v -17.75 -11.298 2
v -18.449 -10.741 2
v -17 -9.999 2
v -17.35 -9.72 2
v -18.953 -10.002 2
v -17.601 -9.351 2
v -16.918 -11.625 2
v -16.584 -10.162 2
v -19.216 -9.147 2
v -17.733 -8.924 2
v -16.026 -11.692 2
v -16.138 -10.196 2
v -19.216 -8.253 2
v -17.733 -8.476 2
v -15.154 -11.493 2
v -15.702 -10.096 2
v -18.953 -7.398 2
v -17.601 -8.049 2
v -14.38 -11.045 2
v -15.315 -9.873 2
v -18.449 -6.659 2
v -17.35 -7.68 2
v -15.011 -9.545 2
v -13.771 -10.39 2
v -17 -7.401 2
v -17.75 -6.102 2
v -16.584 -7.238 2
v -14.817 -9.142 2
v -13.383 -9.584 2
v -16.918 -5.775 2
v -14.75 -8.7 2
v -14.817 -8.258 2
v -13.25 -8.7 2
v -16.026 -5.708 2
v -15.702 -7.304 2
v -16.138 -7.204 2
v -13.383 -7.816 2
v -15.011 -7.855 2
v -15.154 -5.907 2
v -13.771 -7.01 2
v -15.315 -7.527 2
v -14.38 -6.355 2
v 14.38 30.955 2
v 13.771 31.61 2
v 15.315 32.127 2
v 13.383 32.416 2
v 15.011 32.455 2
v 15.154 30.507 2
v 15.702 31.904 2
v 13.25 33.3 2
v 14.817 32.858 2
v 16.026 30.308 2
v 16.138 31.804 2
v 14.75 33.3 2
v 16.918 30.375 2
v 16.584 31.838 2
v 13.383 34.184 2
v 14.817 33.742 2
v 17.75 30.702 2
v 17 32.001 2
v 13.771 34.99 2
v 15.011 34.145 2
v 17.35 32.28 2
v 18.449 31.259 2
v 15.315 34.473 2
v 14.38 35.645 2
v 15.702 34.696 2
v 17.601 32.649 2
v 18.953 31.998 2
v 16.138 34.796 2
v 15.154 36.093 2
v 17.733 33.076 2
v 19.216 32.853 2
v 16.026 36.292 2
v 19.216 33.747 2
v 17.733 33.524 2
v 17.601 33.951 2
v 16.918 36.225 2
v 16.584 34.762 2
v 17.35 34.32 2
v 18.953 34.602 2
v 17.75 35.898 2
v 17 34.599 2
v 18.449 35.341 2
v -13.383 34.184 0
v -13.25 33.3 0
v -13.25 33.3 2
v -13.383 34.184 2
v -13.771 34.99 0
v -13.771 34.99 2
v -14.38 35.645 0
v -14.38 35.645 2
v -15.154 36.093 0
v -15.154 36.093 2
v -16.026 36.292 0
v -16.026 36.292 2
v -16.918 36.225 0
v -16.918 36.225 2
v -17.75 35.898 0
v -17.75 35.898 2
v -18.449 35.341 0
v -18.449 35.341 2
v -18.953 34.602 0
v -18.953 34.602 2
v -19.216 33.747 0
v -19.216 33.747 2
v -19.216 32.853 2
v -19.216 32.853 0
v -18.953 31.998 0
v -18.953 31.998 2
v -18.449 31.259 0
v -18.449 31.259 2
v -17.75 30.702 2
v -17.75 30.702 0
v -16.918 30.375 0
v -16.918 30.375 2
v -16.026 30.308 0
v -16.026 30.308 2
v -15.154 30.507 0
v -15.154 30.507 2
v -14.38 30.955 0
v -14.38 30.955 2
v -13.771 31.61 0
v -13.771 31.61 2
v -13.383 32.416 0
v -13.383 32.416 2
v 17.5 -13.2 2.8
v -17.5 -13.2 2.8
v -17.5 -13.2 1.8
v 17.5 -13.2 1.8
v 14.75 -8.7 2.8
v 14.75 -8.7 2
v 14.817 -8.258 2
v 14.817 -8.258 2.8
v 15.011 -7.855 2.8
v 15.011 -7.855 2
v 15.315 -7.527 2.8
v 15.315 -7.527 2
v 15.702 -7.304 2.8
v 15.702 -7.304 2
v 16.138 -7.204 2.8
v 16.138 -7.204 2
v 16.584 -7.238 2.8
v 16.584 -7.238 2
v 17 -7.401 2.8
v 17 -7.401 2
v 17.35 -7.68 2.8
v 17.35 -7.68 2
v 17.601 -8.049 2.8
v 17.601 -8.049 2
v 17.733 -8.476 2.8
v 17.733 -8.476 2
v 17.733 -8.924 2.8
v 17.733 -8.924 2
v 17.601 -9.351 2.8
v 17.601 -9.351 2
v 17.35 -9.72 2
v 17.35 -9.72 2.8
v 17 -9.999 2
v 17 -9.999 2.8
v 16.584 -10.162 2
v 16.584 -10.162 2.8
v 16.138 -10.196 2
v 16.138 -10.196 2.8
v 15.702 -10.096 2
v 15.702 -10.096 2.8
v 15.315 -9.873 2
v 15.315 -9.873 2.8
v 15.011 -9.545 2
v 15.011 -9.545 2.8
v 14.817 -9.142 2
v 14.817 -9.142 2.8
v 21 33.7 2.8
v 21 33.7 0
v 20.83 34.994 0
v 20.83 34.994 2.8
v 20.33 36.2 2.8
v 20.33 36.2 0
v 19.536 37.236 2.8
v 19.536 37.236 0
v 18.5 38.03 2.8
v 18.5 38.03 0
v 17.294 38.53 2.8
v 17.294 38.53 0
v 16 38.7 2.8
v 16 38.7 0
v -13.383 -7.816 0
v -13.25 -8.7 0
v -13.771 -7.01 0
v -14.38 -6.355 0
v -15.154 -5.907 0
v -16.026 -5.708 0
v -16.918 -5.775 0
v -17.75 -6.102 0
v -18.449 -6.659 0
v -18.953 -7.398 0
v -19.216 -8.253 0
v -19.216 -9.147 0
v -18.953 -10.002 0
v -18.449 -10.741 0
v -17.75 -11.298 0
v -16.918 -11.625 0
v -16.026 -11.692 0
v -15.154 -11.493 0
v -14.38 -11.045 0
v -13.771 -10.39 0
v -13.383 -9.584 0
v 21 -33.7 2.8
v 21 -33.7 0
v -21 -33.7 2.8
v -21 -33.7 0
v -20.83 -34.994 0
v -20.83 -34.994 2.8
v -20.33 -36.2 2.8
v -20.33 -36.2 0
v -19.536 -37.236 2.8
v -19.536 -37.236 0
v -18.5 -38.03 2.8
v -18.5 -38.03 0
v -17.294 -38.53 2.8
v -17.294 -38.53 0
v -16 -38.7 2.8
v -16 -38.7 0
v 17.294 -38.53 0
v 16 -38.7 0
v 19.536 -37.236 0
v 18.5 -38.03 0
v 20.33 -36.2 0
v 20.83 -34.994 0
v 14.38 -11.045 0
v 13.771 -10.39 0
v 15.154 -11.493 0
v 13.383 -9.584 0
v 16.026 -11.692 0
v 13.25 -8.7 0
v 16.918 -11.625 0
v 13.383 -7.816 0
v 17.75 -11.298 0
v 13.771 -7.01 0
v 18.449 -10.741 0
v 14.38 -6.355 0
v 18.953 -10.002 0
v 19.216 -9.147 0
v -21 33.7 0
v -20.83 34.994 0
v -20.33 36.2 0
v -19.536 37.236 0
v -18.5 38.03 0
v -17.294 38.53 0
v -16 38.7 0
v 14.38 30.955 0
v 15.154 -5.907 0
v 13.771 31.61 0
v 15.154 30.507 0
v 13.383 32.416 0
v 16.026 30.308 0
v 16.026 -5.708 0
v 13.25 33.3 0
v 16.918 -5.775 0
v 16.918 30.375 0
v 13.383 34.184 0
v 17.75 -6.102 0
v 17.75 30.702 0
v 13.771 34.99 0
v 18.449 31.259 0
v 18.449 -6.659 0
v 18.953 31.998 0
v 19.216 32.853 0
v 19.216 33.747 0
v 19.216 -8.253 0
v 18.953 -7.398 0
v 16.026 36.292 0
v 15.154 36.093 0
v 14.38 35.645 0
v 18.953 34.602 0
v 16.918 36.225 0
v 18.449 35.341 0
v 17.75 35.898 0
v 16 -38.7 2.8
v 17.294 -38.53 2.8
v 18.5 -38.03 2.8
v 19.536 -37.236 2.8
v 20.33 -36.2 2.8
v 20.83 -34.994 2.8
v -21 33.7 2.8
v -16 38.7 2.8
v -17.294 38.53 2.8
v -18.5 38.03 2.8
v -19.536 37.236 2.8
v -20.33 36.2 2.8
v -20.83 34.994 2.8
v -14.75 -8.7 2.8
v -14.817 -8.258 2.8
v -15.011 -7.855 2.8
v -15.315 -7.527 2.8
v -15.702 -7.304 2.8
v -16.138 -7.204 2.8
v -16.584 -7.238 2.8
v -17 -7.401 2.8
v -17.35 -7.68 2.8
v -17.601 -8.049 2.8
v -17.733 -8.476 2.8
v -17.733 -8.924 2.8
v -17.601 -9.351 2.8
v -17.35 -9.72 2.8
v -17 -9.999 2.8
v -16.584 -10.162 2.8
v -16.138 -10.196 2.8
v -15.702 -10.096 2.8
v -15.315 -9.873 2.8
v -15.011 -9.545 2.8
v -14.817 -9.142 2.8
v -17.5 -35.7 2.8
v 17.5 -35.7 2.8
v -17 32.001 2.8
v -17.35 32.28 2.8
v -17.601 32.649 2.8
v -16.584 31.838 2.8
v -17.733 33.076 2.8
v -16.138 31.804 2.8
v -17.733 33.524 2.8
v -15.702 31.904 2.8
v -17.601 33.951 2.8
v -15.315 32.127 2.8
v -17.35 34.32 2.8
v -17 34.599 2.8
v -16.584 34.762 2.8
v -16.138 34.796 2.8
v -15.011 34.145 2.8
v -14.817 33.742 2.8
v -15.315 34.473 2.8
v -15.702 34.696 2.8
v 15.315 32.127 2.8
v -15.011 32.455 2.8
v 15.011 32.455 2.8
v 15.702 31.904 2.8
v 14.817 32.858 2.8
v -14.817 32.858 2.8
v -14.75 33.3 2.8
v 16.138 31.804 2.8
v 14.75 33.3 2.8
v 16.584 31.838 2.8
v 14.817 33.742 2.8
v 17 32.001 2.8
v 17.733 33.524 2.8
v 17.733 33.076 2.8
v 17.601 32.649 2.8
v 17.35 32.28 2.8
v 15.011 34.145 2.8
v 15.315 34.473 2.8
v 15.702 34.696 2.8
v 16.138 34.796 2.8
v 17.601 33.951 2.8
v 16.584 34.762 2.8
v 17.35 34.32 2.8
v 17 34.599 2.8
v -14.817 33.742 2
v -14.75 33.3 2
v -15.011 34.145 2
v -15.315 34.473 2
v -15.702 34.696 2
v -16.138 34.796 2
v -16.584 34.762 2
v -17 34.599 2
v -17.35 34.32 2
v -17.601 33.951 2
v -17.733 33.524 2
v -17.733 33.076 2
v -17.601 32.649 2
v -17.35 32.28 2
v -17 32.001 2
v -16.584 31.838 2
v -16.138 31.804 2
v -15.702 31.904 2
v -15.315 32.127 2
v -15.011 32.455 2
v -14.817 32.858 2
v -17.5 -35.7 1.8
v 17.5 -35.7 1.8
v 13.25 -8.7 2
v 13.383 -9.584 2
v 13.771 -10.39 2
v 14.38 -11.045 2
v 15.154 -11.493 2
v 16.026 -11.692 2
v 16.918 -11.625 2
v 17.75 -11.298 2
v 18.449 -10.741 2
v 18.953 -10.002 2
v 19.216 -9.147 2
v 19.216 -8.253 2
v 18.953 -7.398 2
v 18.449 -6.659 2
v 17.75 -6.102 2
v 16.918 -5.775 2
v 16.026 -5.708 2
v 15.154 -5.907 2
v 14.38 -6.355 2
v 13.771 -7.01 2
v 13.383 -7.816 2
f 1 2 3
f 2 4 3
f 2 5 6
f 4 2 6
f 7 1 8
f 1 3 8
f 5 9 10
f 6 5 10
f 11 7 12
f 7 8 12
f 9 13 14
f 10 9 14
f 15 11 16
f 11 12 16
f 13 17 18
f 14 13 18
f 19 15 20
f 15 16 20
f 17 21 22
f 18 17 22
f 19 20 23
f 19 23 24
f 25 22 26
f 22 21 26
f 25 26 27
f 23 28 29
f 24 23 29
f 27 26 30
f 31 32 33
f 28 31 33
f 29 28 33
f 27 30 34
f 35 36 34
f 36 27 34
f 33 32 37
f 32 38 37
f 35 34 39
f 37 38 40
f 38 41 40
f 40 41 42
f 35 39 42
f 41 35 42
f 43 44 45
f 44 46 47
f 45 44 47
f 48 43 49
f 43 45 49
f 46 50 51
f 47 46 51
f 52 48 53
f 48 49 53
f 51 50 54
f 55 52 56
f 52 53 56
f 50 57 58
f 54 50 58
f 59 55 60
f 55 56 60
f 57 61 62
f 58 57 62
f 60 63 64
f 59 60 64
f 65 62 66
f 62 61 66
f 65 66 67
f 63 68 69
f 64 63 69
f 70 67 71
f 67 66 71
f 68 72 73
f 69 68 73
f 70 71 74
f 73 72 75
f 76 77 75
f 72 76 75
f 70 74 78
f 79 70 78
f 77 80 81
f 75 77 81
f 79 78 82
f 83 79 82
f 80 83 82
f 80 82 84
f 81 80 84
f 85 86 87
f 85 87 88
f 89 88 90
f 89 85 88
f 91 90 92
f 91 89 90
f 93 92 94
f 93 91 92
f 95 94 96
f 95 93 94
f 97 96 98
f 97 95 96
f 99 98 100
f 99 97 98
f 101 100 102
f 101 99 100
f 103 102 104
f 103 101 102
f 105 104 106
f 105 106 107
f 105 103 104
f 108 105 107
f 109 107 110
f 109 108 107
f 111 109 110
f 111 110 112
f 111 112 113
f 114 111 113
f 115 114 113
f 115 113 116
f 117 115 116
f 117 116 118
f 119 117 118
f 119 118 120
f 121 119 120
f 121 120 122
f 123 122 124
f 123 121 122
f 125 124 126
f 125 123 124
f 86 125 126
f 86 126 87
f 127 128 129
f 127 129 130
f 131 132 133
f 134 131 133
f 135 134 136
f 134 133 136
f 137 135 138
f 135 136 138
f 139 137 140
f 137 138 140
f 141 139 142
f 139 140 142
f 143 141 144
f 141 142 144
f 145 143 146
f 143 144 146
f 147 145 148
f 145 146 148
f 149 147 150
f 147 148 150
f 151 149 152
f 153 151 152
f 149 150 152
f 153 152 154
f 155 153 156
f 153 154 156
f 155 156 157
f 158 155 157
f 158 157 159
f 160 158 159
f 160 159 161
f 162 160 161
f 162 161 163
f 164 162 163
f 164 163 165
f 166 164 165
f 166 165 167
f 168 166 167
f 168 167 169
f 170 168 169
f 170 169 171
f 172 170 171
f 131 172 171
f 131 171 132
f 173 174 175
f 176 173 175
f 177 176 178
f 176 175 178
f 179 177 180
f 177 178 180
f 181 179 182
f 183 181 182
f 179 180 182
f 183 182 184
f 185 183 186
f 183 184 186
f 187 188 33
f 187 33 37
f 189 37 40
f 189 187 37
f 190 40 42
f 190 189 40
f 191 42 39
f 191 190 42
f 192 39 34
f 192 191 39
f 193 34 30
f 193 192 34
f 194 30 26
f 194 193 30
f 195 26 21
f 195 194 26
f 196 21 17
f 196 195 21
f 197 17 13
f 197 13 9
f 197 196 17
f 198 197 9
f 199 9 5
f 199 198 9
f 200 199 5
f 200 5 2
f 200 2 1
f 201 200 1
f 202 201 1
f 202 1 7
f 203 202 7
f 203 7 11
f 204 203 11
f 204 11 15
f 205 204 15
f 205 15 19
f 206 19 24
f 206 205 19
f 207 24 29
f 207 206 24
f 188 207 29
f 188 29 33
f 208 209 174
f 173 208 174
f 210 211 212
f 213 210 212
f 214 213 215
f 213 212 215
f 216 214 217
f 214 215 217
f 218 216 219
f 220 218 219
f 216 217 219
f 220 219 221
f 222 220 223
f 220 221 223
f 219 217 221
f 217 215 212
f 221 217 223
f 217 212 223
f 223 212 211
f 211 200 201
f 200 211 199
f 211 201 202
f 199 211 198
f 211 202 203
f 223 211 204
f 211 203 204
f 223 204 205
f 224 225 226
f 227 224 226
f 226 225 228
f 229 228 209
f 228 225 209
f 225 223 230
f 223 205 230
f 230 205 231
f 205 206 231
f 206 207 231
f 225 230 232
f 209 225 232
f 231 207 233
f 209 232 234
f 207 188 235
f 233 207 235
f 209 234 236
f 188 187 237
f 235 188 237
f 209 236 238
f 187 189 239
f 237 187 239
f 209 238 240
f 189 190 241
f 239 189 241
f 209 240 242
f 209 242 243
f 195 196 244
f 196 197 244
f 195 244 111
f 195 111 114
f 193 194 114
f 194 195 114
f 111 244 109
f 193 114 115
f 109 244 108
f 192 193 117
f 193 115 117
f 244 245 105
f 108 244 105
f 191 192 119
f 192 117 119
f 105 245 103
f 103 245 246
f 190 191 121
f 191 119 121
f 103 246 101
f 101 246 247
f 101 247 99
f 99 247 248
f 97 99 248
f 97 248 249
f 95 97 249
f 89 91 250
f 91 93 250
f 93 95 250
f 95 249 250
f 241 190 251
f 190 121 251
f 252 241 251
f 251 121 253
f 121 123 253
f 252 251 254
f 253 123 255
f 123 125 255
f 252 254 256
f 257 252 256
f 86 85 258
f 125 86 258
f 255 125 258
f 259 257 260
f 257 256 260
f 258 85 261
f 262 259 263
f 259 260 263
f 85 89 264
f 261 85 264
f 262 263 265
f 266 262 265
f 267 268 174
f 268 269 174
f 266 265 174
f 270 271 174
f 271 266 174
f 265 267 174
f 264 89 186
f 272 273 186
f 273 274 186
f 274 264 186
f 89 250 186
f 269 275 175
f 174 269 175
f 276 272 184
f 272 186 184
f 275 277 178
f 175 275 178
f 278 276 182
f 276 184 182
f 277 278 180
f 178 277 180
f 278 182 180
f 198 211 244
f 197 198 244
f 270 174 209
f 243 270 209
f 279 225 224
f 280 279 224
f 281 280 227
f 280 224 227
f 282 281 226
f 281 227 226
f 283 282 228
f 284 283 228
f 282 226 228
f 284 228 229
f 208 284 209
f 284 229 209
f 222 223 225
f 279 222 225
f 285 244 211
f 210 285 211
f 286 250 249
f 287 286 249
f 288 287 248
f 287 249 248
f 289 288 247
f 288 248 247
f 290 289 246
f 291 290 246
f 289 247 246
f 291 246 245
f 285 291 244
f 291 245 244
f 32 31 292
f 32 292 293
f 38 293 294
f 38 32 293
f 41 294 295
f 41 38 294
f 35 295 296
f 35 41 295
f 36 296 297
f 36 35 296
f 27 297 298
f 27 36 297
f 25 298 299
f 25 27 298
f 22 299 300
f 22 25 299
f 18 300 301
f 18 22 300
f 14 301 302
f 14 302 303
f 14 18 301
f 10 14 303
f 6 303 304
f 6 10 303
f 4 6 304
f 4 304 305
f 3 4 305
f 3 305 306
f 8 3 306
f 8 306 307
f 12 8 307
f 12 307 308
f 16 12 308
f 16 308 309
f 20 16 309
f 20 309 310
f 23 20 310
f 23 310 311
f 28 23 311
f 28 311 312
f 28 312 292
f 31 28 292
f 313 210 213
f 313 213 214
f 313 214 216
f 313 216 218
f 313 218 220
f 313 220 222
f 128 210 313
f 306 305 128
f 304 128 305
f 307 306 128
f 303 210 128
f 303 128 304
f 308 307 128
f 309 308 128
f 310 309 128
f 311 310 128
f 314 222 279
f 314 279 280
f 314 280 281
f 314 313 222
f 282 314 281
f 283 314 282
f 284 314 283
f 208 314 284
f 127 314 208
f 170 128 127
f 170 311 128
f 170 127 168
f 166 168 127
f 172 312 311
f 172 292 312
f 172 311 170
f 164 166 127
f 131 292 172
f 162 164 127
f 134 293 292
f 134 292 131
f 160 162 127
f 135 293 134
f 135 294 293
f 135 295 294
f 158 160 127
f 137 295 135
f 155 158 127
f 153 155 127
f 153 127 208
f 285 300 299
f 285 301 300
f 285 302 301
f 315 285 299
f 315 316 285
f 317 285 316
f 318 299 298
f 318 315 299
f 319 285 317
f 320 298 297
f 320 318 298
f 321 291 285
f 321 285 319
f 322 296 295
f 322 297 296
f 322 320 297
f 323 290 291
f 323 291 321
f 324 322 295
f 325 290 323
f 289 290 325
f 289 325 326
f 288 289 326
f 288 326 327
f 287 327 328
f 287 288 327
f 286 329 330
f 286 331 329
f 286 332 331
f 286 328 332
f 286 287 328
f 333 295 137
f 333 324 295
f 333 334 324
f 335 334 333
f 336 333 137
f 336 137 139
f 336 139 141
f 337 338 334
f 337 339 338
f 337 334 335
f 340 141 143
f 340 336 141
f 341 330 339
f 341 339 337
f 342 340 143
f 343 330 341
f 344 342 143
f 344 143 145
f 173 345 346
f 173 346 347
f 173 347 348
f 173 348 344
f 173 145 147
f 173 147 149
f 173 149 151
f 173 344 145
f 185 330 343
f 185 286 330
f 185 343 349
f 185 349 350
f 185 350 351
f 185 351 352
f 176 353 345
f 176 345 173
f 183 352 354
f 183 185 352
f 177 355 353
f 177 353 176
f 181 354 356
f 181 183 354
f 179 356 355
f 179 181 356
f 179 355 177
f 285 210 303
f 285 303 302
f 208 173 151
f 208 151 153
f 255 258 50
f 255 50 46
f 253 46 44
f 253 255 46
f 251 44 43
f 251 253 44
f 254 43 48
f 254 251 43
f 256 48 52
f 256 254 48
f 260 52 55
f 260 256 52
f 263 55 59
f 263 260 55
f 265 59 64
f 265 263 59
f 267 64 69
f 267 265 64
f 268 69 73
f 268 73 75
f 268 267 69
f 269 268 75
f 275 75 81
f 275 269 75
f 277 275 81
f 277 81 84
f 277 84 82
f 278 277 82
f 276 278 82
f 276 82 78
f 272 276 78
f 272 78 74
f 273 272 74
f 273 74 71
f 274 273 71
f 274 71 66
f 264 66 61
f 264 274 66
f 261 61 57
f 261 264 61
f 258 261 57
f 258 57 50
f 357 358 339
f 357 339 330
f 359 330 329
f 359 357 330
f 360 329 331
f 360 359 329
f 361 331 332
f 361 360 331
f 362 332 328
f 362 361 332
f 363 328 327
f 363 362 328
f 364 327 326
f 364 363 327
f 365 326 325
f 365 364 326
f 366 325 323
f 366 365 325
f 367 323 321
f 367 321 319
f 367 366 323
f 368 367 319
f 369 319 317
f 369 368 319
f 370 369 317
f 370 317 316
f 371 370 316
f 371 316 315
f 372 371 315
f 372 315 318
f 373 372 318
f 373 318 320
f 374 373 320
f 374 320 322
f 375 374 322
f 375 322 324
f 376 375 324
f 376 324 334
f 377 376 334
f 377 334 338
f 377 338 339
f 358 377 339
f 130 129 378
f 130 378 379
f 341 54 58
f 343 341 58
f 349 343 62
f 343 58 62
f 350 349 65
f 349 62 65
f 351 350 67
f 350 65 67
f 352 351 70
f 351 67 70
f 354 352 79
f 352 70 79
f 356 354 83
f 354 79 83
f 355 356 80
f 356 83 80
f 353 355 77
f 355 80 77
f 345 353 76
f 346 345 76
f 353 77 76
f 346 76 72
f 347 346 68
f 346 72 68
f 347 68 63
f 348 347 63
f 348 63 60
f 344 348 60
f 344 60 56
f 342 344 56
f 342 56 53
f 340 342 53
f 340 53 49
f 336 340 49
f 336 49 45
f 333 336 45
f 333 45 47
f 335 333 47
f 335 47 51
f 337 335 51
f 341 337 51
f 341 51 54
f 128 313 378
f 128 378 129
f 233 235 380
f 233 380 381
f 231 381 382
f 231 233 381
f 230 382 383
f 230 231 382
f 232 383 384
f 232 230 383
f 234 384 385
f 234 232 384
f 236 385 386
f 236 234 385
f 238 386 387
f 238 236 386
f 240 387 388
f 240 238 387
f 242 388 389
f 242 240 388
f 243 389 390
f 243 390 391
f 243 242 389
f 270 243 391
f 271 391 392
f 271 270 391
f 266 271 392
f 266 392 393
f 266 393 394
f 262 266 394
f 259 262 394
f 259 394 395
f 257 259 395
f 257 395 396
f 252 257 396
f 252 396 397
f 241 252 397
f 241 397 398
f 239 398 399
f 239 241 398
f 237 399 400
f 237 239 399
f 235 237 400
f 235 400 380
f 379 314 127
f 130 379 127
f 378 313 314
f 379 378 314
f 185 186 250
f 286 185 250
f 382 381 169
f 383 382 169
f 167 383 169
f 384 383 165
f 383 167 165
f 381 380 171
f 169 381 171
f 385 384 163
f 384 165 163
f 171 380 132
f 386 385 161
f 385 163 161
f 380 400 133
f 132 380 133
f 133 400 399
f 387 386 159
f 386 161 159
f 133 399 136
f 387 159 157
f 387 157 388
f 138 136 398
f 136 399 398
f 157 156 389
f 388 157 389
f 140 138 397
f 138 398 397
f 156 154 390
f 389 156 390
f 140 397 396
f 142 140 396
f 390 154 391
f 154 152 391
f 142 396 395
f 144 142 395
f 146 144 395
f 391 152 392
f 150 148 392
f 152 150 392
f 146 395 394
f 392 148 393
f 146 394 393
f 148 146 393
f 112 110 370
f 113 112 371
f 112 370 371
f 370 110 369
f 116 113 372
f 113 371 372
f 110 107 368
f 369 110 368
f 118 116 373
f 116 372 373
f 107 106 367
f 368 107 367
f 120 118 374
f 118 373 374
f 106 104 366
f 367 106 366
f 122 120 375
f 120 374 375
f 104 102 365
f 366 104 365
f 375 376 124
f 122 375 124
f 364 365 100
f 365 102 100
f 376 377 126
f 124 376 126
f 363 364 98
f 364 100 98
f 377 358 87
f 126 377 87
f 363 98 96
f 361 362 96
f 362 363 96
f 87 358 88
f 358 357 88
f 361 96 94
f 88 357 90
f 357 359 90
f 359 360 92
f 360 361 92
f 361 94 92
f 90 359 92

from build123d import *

# Parameters (mm, degrees)
F0_R     = 3
F0_R_2   = 1.5
F1_DEPTH = 2.8
F2_DEPTH = 2
F3_W     = 35
F3_H     = 22.5
F4_DEPTH = 1


with BuildPart() as f1:
    # F0 (on Top) → F1 (new body)
    with BuildSketch(Plane.XY):
        with BuildLine():
            Line((16, 38.7), (-16, 38.7))
            ThreePointArc((-16, 38.7), (-19.535534, 37.235534), (-21, 33.7))
            Line((-21, 33.7), (-21, -33.7))
            ThreePointArc((-21, -33.7), (-19.535534, -37.235534), (-16, -38.7))
            Line((-16, -38.7), (16, -38.7))
            ThreePointArc((16, -38.7), (19.535534, -37.235534), (21, -33.7))
            Line((21, -33.7), (21, 33.7))
            ThreePointArc((21, 33.7), (19.535534, 37.235534), (16, 38.7))
        make_face()
        with Locations((-16.25, -8.7)):
            Circle(F0_R, mode=Mode.SUBTRACT)
        with BuildLine():
            ThreePointArc((19.25, -8.7), (16.25, -11.7), (13.25, -8.7))
            ThreePointArc((13.25, -8.7), (16.25, -5.7), (19.25, -8.7))
        make_face(mode=Mode.SUBTRACT)
        with Locations((-16.25, 33.3)):
            Circle(F0_R, mode=Mode.SUBTRACT)
        with BuildLine():
            ThreePointArc((19.25, 33.3), (16.25, 30.3), (13.25, 33.3))
            ThreePointArc((13.25, 33.3), (16.25, 36.3), (19.25, 33.3))
        make_face(mode=Mode.SUBTRACT)
        with Locations((-16.25, 33.3)):
            Circle(F0_R)
        with Locations((-16.25, 33.3)):
            Circle(F0_R_2, mode=Mode.SUBTRACT)
        with BuildLine():
            ThreePointArc((19.25, 33.3), (16.25, 36.3), (13.25, 33.3))
            ThreePointArc((13.25, 33.3), (16.25, 30.3), (19.25, 33.3))
        make_face()
        with BuildLine():
            ThreePointArc((17.75, 33.3), (16.25, 31.8), (14.75, 33.3))
            ThreePointArc((14.75, 33.3), (16.25, 34.8), (17.75, 33.3))
        make_face(mode=Mode.SUBTRACT)
        with Locations((-16.25, -8.7)):
            Circle(F0_R)
        with Locations((-16.25, -8.7)):
            Circle(F0_R_2, mode=Mode.SUBTRACT)
        with BuildLine():
            ThreePointArc((19.25, -8.7), (16.25, -5.7), (13.25, -8.7))
            ThreePointArc((13.25, -8.7), (16.25, -11.7), (19.25, -8.7))
        make_face()
        with BuildLine():
            ThreePointArc((17.75, -8.7), (16.25, -10.2), (14.75, -8.7))
            ThreePointArc((14.75, -8.7), (16.25, -7.2), (17.75, -8.7))
        make_face(mode=Mode.SUBTRACT)
    extrude(amount=F1_DEPTH)

    # F0 (on Top) → F2 (cut)
    with BuildSketch(Plane.XY):
        with BuildLine():
            ThreePointArc((19.25, 33.3), (16.25, 36.3), (13.25, 33.3))
            ThreePointArc((13.25, 33.3), (16.25, 30.3), (19.25, 33.3))
        make_face()
        with BuildLine():
            ThreePointArc((17.75, 33.3), (16.25, 31.8), (14.75, 33.3))
            ThreePointArc((14.75, 33.3), (16.25, 34.8), (17.75, 33.3))
        make_face(mode=Mode.SUBTRACT)
        with Locations((-16.25, 33.3)):
            Circle(F0_R)
        with Locations((-16.25, 33.3)):
            Circle(F0_R_2, mode=Mode.SUBTRACT)
        with BuildLine():
            ThreePointArc((19.25, -8.7), (16.25, -5.7), (13.25, -8.7))
            ThreePointArc((13.25, -8.7), (16.25, -11.7), (19.25, -8.7))
        make_face()
        with BuildLine():
            ThreePointArc((17.75, -8.7), (16.25, -10.2), (14.75, -8.7))
            ThreePointArc((14.75, -8.7), (16.25, -7.2), (17.75, -8.7))
        make_face(mode=Mode.SUBTRACT)
        with Locations((-16.25, -8.7)):
            Circle(F0_R)
        with Locations((-16.25, -8.7)):
            Circle(F0_R_2, mode=Mode.SUBTRACT)
    extrude(amount=F2_DEPTH, mode=Mode.SUBTRACT)

    # F3 (on face) → F4 (cut)
    with BuildSketch(Plane.XY.offset(2.8)):
        with Locations((0, -24.45)):
            Rectangle(F3_W, F3_H)
    extrude(amount=-F4_DEPTH, mode=Mode.SUBTRACT)


solid = f1.part
